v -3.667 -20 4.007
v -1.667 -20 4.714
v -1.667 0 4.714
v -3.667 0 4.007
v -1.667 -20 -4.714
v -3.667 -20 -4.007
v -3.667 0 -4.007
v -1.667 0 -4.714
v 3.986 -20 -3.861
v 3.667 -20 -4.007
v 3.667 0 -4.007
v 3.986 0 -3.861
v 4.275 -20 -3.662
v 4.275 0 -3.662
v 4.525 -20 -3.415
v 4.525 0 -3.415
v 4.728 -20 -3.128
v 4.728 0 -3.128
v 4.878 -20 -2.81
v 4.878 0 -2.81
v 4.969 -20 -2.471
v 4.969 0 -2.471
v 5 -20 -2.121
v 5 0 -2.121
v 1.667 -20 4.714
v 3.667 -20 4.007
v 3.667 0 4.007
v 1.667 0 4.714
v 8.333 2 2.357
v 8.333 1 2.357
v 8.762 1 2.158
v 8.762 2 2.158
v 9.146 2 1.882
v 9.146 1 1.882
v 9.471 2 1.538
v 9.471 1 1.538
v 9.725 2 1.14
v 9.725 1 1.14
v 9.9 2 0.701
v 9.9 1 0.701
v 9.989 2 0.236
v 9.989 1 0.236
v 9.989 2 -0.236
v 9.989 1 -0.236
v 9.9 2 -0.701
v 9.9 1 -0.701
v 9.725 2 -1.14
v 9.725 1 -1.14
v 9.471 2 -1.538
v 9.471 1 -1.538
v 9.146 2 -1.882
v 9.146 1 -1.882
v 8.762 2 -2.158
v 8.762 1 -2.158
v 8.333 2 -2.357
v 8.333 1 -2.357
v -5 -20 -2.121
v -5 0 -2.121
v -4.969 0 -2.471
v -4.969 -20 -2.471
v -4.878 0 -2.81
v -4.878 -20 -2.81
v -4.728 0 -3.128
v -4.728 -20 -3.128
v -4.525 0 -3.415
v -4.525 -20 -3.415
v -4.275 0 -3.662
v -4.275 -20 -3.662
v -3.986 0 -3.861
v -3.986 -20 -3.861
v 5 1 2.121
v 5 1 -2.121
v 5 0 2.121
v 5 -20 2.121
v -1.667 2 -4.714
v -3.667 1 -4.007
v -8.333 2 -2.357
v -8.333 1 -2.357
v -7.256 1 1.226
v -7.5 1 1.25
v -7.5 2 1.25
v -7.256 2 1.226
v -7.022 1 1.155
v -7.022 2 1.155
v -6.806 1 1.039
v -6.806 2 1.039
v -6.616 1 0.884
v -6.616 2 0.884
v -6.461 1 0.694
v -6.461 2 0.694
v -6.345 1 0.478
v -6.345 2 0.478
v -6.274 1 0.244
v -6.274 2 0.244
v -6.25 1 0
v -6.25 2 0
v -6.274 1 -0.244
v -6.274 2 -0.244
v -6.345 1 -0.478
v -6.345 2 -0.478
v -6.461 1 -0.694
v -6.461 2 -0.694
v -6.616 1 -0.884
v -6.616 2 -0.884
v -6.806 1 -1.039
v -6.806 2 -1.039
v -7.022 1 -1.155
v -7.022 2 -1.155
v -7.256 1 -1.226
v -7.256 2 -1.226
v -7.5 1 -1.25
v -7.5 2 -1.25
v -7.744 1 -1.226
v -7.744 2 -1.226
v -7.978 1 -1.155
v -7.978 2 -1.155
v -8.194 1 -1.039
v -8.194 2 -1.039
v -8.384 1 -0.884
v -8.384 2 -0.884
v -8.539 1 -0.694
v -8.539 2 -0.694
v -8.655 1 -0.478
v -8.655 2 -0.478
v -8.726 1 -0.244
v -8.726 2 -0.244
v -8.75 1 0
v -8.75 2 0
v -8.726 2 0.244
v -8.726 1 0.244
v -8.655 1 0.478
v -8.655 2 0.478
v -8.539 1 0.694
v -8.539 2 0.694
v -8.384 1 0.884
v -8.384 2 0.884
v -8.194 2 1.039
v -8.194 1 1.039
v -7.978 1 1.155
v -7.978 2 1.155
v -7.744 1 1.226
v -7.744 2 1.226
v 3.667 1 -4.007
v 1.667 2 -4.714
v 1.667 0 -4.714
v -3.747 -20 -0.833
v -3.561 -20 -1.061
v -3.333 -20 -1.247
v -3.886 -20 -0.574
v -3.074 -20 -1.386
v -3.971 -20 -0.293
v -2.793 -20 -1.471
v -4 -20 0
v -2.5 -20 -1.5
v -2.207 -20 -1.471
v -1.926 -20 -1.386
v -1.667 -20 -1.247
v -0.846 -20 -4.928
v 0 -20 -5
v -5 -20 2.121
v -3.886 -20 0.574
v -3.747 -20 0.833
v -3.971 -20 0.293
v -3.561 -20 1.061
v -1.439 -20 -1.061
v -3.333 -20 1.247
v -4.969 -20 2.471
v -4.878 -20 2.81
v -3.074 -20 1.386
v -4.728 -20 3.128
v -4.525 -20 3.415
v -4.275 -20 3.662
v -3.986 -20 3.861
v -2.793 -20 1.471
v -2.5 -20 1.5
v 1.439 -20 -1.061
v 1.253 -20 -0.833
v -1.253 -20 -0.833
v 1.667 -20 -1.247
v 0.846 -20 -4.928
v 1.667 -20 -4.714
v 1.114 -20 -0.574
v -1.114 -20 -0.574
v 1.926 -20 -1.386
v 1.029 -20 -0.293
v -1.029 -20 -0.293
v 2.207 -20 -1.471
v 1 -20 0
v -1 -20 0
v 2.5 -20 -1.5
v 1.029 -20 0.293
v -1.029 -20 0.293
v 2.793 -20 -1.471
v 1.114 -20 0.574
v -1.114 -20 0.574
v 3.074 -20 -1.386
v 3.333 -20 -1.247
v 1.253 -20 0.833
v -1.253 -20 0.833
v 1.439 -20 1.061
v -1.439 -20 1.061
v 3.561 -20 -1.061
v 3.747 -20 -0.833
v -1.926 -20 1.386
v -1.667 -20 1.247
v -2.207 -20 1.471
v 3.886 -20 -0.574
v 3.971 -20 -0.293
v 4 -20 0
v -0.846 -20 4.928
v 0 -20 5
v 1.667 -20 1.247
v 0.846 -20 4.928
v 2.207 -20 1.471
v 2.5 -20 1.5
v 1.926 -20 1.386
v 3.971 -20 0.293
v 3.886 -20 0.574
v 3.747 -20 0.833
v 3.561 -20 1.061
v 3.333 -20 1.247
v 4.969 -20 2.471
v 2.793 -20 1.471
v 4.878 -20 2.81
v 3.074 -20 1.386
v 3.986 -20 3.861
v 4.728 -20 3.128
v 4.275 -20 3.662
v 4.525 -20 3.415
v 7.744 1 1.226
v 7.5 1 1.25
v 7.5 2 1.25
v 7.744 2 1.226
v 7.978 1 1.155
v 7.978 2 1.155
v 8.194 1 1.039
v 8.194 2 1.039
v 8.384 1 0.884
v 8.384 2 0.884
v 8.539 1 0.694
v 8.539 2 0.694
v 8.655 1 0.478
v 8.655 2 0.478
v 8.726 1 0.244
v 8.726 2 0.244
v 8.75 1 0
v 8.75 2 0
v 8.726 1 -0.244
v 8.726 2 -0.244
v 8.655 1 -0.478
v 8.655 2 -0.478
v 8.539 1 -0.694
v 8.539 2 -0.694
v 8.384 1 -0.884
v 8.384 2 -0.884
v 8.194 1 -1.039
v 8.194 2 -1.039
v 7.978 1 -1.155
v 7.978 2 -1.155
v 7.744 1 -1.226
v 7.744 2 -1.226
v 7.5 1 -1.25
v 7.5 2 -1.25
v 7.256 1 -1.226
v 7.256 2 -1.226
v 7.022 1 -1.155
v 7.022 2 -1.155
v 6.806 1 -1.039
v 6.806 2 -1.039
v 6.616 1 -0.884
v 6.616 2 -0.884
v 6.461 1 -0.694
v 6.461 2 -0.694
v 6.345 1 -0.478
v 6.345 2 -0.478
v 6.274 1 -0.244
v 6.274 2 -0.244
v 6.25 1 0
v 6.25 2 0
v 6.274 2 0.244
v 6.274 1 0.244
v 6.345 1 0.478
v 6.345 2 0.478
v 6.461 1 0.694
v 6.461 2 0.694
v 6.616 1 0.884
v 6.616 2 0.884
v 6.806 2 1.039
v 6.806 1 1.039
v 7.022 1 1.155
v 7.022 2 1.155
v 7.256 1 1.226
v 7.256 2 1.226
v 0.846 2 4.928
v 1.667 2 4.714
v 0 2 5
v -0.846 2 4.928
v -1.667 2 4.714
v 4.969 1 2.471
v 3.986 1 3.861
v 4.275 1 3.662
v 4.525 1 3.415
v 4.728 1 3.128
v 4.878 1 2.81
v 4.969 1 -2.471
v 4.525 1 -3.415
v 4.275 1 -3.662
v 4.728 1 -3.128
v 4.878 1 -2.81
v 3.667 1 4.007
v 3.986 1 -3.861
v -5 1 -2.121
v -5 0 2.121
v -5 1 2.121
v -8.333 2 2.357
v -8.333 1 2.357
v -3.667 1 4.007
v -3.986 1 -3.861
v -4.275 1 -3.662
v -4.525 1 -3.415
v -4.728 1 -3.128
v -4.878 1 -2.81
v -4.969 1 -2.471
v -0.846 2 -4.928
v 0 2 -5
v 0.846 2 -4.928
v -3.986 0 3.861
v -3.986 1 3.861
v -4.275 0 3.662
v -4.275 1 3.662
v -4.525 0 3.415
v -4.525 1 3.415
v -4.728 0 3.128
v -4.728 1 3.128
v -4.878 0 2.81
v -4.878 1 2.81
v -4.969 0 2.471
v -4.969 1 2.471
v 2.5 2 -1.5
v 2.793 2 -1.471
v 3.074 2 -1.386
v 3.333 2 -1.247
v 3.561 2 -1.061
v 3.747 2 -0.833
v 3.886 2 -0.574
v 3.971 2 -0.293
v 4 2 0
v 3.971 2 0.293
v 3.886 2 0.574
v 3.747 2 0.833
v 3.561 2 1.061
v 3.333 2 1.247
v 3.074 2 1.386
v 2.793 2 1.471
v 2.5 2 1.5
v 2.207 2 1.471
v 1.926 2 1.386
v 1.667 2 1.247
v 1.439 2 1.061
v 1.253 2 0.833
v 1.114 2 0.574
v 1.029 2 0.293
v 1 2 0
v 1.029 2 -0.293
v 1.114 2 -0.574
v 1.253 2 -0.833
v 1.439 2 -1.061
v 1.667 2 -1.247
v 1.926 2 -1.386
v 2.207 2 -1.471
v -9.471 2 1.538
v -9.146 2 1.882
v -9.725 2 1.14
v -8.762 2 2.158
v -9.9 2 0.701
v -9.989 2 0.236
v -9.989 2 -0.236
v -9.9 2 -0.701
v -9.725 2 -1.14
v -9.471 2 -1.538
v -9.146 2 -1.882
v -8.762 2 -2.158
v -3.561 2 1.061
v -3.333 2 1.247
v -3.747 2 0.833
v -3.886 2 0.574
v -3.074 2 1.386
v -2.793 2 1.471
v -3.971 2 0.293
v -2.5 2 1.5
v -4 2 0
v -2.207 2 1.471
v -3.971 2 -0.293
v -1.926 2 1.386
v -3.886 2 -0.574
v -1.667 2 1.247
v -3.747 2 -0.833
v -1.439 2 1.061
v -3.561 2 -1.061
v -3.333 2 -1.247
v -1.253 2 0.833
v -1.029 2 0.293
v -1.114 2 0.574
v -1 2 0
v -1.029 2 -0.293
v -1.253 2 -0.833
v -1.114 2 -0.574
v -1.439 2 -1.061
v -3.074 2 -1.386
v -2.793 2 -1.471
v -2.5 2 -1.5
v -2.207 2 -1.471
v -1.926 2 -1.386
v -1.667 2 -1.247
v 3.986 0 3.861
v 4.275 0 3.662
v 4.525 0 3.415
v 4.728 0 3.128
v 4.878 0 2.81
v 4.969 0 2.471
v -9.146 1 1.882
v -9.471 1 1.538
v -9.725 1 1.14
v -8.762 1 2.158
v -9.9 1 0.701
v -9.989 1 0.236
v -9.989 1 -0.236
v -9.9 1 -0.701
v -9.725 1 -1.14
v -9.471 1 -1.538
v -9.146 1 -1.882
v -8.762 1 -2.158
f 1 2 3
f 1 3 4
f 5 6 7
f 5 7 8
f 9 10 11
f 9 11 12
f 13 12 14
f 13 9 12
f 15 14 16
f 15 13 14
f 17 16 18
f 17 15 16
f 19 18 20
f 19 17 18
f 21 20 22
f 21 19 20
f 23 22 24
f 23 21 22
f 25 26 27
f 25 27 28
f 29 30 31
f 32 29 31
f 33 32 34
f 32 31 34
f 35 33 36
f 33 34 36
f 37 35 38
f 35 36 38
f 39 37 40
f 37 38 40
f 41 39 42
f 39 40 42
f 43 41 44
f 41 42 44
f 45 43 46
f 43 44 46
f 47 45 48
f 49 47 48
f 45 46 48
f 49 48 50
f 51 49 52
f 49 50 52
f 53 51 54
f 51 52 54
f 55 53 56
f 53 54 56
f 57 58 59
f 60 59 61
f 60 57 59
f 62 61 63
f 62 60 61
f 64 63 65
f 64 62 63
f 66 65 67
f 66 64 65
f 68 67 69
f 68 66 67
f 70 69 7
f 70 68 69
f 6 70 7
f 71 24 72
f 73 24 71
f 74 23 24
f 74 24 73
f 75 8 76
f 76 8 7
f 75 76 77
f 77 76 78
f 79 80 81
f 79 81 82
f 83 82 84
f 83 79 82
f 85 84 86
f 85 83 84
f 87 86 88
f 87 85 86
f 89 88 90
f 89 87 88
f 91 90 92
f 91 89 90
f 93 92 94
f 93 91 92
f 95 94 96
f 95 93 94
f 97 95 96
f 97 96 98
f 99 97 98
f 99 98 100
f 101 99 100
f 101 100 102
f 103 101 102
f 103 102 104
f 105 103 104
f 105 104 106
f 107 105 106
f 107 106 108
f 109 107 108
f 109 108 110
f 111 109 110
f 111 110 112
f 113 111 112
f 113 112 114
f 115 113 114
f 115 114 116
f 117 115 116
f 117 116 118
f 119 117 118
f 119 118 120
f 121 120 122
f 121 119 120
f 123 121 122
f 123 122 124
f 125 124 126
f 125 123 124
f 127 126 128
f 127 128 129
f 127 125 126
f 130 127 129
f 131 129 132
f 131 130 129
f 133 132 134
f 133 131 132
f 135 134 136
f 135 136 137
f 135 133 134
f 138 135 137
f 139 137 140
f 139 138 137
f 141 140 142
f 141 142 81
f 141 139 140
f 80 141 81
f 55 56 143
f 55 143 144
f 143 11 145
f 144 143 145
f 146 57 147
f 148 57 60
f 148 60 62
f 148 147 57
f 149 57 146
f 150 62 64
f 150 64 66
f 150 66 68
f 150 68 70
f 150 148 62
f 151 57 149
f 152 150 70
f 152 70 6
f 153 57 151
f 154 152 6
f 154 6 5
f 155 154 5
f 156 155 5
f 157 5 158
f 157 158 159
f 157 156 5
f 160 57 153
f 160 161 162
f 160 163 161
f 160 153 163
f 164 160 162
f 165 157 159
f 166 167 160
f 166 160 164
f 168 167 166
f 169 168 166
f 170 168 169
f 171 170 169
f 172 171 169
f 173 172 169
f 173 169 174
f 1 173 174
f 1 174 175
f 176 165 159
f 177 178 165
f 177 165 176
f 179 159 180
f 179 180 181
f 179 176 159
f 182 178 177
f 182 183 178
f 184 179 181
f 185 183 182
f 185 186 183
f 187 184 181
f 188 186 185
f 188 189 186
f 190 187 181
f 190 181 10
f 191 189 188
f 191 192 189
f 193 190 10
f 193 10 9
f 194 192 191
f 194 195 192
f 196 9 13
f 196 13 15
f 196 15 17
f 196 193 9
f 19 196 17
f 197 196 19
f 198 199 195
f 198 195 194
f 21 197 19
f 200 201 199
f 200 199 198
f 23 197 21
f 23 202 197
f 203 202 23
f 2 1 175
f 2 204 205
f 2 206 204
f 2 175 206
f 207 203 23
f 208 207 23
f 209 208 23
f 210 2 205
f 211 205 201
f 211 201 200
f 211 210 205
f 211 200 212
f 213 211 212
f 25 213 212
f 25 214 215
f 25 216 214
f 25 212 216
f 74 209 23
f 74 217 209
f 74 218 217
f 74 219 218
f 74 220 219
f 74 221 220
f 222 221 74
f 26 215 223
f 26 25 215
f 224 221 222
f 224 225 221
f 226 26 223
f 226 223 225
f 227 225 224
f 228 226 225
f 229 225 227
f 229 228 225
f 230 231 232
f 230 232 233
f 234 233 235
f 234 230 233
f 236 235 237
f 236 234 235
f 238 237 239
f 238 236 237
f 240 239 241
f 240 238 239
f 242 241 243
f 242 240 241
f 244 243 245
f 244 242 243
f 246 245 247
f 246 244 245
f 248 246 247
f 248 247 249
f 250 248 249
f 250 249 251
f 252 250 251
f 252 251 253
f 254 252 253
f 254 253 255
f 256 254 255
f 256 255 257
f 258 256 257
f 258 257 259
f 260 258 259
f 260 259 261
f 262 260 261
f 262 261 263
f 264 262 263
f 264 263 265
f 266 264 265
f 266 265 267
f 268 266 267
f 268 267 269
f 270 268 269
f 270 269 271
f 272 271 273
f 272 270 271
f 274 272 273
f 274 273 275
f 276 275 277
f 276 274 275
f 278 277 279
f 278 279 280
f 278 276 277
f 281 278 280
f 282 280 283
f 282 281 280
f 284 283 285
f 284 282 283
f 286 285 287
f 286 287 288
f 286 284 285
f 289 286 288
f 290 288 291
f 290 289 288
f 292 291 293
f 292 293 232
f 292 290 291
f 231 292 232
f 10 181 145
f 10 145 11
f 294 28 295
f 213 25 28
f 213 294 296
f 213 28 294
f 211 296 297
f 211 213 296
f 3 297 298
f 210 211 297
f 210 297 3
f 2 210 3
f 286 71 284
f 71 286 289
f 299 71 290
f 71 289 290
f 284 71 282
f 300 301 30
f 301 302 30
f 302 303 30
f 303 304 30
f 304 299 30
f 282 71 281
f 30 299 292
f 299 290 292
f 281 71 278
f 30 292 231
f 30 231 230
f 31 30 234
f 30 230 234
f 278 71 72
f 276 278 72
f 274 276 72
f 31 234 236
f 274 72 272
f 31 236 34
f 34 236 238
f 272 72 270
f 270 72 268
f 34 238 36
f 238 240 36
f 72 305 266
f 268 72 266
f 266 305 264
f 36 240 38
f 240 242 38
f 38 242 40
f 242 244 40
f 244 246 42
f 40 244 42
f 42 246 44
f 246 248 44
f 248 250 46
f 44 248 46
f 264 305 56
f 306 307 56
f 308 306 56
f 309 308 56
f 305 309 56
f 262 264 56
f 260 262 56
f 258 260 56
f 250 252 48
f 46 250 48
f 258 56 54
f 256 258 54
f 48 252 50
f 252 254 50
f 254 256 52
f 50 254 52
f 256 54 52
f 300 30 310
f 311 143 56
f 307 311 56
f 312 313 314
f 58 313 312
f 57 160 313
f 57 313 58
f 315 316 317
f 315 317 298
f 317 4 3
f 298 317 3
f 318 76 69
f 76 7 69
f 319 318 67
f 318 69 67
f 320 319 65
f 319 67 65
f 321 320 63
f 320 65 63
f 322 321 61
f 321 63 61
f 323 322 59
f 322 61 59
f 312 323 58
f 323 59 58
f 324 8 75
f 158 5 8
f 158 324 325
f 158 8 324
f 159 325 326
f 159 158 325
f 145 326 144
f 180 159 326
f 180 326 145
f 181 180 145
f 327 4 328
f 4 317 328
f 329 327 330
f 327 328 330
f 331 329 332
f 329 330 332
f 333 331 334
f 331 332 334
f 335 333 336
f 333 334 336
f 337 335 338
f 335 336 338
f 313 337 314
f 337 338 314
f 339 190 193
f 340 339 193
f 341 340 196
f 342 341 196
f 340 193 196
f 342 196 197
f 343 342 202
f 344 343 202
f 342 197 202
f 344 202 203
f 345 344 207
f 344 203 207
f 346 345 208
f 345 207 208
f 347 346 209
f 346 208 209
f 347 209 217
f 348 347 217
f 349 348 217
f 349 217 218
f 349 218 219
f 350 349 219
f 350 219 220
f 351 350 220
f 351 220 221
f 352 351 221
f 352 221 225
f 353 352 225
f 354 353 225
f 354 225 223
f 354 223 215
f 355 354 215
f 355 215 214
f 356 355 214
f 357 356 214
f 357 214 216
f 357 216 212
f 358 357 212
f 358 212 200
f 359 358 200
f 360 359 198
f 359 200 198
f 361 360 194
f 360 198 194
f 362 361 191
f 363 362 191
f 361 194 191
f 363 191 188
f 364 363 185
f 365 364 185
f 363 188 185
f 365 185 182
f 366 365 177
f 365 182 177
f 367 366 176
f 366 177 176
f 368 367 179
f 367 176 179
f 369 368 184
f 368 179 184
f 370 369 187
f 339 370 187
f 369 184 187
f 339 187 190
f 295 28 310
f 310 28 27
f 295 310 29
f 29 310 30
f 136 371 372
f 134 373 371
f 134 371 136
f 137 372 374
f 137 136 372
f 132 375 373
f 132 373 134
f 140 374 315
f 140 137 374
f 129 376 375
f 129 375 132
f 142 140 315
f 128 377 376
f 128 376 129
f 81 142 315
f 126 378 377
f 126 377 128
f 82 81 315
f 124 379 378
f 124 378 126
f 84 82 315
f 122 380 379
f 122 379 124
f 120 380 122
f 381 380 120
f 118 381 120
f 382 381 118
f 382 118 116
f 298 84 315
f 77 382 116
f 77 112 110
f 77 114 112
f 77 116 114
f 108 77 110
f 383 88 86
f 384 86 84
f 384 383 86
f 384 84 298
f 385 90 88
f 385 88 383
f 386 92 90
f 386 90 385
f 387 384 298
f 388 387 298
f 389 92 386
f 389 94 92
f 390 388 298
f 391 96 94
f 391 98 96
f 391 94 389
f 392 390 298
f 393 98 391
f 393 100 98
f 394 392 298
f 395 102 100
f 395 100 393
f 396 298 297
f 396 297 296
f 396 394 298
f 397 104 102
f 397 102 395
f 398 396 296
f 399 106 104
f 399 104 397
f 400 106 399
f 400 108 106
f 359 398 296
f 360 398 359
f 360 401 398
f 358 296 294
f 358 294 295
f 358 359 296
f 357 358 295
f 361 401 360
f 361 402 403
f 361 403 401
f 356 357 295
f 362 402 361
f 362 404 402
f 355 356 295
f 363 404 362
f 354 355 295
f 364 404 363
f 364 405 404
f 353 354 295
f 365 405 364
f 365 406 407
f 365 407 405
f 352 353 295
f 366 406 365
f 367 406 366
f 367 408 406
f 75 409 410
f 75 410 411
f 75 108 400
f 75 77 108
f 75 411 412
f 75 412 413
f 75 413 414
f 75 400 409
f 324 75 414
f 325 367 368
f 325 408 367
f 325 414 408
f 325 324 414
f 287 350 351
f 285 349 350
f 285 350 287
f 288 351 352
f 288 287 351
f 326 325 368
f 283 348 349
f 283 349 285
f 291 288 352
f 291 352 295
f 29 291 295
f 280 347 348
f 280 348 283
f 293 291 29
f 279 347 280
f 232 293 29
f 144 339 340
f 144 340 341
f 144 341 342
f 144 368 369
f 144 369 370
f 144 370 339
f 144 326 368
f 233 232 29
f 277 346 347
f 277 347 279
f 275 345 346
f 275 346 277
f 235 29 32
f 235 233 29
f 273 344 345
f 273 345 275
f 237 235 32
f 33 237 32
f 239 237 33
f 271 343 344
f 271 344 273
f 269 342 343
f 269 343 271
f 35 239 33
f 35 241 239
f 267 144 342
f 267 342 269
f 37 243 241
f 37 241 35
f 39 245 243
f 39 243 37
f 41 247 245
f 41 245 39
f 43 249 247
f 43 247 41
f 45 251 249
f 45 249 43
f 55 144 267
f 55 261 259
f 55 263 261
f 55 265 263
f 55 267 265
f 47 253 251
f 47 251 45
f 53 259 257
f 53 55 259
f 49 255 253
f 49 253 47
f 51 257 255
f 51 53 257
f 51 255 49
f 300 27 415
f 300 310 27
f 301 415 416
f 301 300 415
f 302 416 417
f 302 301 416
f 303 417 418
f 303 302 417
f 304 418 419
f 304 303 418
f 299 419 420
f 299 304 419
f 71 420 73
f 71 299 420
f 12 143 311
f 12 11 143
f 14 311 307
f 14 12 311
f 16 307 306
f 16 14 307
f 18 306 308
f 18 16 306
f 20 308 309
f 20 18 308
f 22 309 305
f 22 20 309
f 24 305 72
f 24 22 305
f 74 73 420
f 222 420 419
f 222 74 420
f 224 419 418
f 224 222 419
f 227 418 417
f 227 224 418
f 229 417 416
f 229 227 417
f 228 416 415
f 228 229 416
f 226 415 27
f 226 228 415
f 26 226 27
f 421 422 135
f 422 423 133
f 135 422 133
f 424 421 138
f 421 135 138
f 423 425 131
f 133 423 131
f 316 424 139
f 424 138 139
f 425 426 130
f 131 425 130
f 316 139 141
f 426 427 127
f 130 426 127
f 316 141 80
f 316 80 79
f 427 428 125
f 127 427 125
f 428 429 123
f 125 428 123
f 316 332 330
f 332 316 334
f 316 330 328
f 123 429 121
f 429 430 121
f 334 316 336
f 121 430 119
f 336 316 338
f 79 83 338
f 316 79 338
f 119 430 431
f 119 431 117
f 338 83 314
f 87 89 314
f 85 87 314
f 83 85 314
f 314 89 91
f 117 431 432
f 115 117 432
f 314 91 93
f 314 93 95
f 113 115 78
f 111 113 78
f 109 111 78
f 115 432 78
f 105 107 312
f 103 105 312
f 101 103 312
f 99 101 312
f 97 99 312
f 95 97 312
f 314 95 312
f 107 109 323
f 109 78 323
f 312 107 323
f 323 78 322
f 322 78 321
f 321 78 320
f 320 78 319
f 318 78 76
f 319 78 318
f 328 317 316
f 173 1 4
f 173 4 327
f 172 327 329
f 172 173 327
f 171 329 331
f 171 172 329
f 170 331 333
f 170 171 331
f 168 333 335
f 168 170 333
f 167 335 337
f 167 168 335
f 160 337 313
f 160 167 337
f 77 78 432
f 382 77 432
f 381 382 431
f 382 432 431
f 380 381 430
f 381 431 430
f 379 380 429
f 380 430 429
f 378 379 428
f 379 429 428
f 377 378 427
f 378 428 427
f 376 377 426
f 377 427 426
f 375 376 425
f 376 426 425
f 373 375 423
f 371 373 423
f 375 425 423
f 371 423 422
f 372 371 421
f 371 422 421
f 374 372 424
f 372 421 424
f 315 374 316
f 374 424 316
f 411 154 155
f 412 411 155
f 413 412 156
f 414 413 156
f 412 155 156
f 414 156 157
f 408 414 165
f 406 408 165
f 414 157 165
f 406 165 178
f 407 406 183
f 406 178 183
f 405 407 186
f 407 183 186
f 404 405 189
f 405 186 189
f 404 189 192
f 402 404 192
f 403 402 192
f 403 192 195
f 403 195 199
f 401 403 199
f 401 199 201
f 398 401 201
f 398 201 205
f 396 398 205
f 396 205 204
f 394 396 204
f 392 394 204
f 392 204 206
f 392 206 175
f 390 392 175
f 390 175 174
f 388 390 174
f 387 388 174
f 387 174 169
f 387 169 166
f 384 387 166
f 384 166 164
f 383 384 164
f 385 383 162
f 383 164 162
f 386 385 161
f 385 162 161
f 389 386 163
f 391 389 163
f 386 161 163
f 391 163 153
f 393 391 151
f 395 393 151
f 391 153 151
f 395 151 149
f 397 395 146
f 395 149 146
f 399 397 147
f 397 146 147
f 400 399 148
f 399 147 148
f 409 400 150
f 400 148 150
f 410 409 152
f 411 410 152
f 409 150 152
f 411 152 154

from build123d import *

# Parameters (mm, degrees)
SKETCH2_R               = 1.25
BOSS_EXTRUDE1_DEPTH     = 2
CUT_EXTRUDE1_DEPTH      = 12.357816692
CUT_EXTRUDE1_DEPTH_BACK = 12.357816692
SKETCH3_W               = 5
SKETCH3_H               = 1
FILLET1_R               = 2
BOSS_EXTRUDE2_START     = 20
BOSS_EXTRUDE2_DEPTH     = 20
SKETCH6_R               = 1.5
CUT_EXTRUDE2_DEPTH      = 25.677925359


with BuildPart() as part:
    # Sketch2 → Boss-Extrude1 (new body)
    with BuildSketch(Plane(origin=(0, 0, 0), x_dir=(1, 0, 0), z_dir=(0, 1, 0))):
        with BuildLine():
            Line((-8.333333333, -2.357022604), (-1.666666667, -4.714045208))
            ThreePointArc((-1.666666667, -4.714045208), (0, -5), (1.666666667, -4.714045208))
            Line((1.666666667, -4.714045208), (8.333333333, -2.357022604))
            ThreePointArc((8.333333333, -2.357022604), (10, 0), (8.333333333, 2.357022604))
            Line((8.333333333, 2.357022604), (1.666666667, 4.714045208))
            ThreePointArc((1.666666667, 4.714045208), (0, 5), (-1.666666667, 4.714045208))
            Line((-1.666666667, 4.714045208), (-8.333333333, 2.357022604))
            ThreePointArc((-8.333333333, 2.357022604), (-10, 0), (-8.333333333, -2.357022604))
        make_face()
        with Locations(Location((-7.5, 0, 0), (0, 0, 270))):
            Circle(SKETCH2_R, mode=Mode.SUBTRACT)
        with Locations(Location((7.5, 0, 0), (0, 0, 270))):
            Circle(SKETCH2_R, mode=Mode.SUBTRACT)
    extrude(amount=BOSS_EXTRUDE1_DEPTH)

    # Sketch3 → Cut-Extrude1 (cut, two sides: drawn at the far end of the back side and taken through both)
    with BuildSketch(Plane.XY.offset(-CUT_EXTRUDE1_DEPTH_BACK)):
        with Locations((-7.5, 0.5)):
            Rectangle(SKETCH3_W, SKETCH3_H)
        with Locations((7.5, 0.5)):
            Rectangle(SKETCH3_W, SKETCH3_H)
    extrude(amount=CUT_EXTRUDE1_DEPTH + CUT_EXTRUDE1_DEPTH_BACK, mode=Mode.SUBTRACT)

    # Fillet1
    fillet1_edges = [part.edges().sort_by_distance(p)[0] for p in [
        (-5, 0.5, -3.535533906),
        (5, 0.5, -3.535533906),
        (-5, 0.5, 3.535533906),
        (5, 0.5, 3.535533906),
    ]]
    fillet(fillet1_edges, radius=FILLET1_R)

    # Sketch5 → Boss-Extrude2 (add)
    with BuildSketch(Plane.XZ.offset(BOSS_EXTRUDE2_START)):
        with BuildLine():
            Line((5, -2.121320344), (5, 2.121320344))
            ThreePointArc((5, 2.121320344), (4.632993162, 3.276020882), (3.666666667, 4.006938427))
            Line((3.666666667, 4.006938427), (1.666666667, 4.714045208))
            ThreePointArc((1.666666667, 4.714045208), (0, 5), (-1.666666667, 4.714045208))
            Line((-1.666666667, 4.714045208), (-3.666666667, 4.006938427))
            ThreePointArc((-3.666666667, 4.006938427), (-4.632993162, 3.276020882), (-5, 2.121320344))
            Line((-5, 2.121320344), (-5, -2.121320344))
            ThreePointArc((-5, -2.121320344), (-4.632993162, -3.276020882), (-3.666666667, -4.006938427))
            Line((-3.666666667, -4.006938427), (-1.666666667, -4.714045208))
            ThreePointArc((-1.666666667, -4.714045208), (0, -5), (1.666666667, -4.714045208))
            Line((1.666666667, -4.714045208), (3.666666667, -4.006938427))
            ThreePointArc((3.666666667, -4.006938427), (4.632993162, -3.276020882), (5, -2.121320344))
        make_face()
    extrude(amount=-BOSS_EXTRUDE2_DEPTH)

    # Sketch6 → Cut-Extrude2 (cut, through all)
    with BuildSketch(Plane.XZ.offset(20)):
        with Locations(Location((-2.5, 0, 0), (0, 0, 270))):
            Circle(SKETCH6_R)
        with Locations(Location((2.5, 0, 0), (0, 0, 270))):
            Circle(SKETCH6_R)
    extrude(amount=-CUT_EXTRUDE2_DEPTH, mode=Mode.SUBTRACT)


solid = part.part
